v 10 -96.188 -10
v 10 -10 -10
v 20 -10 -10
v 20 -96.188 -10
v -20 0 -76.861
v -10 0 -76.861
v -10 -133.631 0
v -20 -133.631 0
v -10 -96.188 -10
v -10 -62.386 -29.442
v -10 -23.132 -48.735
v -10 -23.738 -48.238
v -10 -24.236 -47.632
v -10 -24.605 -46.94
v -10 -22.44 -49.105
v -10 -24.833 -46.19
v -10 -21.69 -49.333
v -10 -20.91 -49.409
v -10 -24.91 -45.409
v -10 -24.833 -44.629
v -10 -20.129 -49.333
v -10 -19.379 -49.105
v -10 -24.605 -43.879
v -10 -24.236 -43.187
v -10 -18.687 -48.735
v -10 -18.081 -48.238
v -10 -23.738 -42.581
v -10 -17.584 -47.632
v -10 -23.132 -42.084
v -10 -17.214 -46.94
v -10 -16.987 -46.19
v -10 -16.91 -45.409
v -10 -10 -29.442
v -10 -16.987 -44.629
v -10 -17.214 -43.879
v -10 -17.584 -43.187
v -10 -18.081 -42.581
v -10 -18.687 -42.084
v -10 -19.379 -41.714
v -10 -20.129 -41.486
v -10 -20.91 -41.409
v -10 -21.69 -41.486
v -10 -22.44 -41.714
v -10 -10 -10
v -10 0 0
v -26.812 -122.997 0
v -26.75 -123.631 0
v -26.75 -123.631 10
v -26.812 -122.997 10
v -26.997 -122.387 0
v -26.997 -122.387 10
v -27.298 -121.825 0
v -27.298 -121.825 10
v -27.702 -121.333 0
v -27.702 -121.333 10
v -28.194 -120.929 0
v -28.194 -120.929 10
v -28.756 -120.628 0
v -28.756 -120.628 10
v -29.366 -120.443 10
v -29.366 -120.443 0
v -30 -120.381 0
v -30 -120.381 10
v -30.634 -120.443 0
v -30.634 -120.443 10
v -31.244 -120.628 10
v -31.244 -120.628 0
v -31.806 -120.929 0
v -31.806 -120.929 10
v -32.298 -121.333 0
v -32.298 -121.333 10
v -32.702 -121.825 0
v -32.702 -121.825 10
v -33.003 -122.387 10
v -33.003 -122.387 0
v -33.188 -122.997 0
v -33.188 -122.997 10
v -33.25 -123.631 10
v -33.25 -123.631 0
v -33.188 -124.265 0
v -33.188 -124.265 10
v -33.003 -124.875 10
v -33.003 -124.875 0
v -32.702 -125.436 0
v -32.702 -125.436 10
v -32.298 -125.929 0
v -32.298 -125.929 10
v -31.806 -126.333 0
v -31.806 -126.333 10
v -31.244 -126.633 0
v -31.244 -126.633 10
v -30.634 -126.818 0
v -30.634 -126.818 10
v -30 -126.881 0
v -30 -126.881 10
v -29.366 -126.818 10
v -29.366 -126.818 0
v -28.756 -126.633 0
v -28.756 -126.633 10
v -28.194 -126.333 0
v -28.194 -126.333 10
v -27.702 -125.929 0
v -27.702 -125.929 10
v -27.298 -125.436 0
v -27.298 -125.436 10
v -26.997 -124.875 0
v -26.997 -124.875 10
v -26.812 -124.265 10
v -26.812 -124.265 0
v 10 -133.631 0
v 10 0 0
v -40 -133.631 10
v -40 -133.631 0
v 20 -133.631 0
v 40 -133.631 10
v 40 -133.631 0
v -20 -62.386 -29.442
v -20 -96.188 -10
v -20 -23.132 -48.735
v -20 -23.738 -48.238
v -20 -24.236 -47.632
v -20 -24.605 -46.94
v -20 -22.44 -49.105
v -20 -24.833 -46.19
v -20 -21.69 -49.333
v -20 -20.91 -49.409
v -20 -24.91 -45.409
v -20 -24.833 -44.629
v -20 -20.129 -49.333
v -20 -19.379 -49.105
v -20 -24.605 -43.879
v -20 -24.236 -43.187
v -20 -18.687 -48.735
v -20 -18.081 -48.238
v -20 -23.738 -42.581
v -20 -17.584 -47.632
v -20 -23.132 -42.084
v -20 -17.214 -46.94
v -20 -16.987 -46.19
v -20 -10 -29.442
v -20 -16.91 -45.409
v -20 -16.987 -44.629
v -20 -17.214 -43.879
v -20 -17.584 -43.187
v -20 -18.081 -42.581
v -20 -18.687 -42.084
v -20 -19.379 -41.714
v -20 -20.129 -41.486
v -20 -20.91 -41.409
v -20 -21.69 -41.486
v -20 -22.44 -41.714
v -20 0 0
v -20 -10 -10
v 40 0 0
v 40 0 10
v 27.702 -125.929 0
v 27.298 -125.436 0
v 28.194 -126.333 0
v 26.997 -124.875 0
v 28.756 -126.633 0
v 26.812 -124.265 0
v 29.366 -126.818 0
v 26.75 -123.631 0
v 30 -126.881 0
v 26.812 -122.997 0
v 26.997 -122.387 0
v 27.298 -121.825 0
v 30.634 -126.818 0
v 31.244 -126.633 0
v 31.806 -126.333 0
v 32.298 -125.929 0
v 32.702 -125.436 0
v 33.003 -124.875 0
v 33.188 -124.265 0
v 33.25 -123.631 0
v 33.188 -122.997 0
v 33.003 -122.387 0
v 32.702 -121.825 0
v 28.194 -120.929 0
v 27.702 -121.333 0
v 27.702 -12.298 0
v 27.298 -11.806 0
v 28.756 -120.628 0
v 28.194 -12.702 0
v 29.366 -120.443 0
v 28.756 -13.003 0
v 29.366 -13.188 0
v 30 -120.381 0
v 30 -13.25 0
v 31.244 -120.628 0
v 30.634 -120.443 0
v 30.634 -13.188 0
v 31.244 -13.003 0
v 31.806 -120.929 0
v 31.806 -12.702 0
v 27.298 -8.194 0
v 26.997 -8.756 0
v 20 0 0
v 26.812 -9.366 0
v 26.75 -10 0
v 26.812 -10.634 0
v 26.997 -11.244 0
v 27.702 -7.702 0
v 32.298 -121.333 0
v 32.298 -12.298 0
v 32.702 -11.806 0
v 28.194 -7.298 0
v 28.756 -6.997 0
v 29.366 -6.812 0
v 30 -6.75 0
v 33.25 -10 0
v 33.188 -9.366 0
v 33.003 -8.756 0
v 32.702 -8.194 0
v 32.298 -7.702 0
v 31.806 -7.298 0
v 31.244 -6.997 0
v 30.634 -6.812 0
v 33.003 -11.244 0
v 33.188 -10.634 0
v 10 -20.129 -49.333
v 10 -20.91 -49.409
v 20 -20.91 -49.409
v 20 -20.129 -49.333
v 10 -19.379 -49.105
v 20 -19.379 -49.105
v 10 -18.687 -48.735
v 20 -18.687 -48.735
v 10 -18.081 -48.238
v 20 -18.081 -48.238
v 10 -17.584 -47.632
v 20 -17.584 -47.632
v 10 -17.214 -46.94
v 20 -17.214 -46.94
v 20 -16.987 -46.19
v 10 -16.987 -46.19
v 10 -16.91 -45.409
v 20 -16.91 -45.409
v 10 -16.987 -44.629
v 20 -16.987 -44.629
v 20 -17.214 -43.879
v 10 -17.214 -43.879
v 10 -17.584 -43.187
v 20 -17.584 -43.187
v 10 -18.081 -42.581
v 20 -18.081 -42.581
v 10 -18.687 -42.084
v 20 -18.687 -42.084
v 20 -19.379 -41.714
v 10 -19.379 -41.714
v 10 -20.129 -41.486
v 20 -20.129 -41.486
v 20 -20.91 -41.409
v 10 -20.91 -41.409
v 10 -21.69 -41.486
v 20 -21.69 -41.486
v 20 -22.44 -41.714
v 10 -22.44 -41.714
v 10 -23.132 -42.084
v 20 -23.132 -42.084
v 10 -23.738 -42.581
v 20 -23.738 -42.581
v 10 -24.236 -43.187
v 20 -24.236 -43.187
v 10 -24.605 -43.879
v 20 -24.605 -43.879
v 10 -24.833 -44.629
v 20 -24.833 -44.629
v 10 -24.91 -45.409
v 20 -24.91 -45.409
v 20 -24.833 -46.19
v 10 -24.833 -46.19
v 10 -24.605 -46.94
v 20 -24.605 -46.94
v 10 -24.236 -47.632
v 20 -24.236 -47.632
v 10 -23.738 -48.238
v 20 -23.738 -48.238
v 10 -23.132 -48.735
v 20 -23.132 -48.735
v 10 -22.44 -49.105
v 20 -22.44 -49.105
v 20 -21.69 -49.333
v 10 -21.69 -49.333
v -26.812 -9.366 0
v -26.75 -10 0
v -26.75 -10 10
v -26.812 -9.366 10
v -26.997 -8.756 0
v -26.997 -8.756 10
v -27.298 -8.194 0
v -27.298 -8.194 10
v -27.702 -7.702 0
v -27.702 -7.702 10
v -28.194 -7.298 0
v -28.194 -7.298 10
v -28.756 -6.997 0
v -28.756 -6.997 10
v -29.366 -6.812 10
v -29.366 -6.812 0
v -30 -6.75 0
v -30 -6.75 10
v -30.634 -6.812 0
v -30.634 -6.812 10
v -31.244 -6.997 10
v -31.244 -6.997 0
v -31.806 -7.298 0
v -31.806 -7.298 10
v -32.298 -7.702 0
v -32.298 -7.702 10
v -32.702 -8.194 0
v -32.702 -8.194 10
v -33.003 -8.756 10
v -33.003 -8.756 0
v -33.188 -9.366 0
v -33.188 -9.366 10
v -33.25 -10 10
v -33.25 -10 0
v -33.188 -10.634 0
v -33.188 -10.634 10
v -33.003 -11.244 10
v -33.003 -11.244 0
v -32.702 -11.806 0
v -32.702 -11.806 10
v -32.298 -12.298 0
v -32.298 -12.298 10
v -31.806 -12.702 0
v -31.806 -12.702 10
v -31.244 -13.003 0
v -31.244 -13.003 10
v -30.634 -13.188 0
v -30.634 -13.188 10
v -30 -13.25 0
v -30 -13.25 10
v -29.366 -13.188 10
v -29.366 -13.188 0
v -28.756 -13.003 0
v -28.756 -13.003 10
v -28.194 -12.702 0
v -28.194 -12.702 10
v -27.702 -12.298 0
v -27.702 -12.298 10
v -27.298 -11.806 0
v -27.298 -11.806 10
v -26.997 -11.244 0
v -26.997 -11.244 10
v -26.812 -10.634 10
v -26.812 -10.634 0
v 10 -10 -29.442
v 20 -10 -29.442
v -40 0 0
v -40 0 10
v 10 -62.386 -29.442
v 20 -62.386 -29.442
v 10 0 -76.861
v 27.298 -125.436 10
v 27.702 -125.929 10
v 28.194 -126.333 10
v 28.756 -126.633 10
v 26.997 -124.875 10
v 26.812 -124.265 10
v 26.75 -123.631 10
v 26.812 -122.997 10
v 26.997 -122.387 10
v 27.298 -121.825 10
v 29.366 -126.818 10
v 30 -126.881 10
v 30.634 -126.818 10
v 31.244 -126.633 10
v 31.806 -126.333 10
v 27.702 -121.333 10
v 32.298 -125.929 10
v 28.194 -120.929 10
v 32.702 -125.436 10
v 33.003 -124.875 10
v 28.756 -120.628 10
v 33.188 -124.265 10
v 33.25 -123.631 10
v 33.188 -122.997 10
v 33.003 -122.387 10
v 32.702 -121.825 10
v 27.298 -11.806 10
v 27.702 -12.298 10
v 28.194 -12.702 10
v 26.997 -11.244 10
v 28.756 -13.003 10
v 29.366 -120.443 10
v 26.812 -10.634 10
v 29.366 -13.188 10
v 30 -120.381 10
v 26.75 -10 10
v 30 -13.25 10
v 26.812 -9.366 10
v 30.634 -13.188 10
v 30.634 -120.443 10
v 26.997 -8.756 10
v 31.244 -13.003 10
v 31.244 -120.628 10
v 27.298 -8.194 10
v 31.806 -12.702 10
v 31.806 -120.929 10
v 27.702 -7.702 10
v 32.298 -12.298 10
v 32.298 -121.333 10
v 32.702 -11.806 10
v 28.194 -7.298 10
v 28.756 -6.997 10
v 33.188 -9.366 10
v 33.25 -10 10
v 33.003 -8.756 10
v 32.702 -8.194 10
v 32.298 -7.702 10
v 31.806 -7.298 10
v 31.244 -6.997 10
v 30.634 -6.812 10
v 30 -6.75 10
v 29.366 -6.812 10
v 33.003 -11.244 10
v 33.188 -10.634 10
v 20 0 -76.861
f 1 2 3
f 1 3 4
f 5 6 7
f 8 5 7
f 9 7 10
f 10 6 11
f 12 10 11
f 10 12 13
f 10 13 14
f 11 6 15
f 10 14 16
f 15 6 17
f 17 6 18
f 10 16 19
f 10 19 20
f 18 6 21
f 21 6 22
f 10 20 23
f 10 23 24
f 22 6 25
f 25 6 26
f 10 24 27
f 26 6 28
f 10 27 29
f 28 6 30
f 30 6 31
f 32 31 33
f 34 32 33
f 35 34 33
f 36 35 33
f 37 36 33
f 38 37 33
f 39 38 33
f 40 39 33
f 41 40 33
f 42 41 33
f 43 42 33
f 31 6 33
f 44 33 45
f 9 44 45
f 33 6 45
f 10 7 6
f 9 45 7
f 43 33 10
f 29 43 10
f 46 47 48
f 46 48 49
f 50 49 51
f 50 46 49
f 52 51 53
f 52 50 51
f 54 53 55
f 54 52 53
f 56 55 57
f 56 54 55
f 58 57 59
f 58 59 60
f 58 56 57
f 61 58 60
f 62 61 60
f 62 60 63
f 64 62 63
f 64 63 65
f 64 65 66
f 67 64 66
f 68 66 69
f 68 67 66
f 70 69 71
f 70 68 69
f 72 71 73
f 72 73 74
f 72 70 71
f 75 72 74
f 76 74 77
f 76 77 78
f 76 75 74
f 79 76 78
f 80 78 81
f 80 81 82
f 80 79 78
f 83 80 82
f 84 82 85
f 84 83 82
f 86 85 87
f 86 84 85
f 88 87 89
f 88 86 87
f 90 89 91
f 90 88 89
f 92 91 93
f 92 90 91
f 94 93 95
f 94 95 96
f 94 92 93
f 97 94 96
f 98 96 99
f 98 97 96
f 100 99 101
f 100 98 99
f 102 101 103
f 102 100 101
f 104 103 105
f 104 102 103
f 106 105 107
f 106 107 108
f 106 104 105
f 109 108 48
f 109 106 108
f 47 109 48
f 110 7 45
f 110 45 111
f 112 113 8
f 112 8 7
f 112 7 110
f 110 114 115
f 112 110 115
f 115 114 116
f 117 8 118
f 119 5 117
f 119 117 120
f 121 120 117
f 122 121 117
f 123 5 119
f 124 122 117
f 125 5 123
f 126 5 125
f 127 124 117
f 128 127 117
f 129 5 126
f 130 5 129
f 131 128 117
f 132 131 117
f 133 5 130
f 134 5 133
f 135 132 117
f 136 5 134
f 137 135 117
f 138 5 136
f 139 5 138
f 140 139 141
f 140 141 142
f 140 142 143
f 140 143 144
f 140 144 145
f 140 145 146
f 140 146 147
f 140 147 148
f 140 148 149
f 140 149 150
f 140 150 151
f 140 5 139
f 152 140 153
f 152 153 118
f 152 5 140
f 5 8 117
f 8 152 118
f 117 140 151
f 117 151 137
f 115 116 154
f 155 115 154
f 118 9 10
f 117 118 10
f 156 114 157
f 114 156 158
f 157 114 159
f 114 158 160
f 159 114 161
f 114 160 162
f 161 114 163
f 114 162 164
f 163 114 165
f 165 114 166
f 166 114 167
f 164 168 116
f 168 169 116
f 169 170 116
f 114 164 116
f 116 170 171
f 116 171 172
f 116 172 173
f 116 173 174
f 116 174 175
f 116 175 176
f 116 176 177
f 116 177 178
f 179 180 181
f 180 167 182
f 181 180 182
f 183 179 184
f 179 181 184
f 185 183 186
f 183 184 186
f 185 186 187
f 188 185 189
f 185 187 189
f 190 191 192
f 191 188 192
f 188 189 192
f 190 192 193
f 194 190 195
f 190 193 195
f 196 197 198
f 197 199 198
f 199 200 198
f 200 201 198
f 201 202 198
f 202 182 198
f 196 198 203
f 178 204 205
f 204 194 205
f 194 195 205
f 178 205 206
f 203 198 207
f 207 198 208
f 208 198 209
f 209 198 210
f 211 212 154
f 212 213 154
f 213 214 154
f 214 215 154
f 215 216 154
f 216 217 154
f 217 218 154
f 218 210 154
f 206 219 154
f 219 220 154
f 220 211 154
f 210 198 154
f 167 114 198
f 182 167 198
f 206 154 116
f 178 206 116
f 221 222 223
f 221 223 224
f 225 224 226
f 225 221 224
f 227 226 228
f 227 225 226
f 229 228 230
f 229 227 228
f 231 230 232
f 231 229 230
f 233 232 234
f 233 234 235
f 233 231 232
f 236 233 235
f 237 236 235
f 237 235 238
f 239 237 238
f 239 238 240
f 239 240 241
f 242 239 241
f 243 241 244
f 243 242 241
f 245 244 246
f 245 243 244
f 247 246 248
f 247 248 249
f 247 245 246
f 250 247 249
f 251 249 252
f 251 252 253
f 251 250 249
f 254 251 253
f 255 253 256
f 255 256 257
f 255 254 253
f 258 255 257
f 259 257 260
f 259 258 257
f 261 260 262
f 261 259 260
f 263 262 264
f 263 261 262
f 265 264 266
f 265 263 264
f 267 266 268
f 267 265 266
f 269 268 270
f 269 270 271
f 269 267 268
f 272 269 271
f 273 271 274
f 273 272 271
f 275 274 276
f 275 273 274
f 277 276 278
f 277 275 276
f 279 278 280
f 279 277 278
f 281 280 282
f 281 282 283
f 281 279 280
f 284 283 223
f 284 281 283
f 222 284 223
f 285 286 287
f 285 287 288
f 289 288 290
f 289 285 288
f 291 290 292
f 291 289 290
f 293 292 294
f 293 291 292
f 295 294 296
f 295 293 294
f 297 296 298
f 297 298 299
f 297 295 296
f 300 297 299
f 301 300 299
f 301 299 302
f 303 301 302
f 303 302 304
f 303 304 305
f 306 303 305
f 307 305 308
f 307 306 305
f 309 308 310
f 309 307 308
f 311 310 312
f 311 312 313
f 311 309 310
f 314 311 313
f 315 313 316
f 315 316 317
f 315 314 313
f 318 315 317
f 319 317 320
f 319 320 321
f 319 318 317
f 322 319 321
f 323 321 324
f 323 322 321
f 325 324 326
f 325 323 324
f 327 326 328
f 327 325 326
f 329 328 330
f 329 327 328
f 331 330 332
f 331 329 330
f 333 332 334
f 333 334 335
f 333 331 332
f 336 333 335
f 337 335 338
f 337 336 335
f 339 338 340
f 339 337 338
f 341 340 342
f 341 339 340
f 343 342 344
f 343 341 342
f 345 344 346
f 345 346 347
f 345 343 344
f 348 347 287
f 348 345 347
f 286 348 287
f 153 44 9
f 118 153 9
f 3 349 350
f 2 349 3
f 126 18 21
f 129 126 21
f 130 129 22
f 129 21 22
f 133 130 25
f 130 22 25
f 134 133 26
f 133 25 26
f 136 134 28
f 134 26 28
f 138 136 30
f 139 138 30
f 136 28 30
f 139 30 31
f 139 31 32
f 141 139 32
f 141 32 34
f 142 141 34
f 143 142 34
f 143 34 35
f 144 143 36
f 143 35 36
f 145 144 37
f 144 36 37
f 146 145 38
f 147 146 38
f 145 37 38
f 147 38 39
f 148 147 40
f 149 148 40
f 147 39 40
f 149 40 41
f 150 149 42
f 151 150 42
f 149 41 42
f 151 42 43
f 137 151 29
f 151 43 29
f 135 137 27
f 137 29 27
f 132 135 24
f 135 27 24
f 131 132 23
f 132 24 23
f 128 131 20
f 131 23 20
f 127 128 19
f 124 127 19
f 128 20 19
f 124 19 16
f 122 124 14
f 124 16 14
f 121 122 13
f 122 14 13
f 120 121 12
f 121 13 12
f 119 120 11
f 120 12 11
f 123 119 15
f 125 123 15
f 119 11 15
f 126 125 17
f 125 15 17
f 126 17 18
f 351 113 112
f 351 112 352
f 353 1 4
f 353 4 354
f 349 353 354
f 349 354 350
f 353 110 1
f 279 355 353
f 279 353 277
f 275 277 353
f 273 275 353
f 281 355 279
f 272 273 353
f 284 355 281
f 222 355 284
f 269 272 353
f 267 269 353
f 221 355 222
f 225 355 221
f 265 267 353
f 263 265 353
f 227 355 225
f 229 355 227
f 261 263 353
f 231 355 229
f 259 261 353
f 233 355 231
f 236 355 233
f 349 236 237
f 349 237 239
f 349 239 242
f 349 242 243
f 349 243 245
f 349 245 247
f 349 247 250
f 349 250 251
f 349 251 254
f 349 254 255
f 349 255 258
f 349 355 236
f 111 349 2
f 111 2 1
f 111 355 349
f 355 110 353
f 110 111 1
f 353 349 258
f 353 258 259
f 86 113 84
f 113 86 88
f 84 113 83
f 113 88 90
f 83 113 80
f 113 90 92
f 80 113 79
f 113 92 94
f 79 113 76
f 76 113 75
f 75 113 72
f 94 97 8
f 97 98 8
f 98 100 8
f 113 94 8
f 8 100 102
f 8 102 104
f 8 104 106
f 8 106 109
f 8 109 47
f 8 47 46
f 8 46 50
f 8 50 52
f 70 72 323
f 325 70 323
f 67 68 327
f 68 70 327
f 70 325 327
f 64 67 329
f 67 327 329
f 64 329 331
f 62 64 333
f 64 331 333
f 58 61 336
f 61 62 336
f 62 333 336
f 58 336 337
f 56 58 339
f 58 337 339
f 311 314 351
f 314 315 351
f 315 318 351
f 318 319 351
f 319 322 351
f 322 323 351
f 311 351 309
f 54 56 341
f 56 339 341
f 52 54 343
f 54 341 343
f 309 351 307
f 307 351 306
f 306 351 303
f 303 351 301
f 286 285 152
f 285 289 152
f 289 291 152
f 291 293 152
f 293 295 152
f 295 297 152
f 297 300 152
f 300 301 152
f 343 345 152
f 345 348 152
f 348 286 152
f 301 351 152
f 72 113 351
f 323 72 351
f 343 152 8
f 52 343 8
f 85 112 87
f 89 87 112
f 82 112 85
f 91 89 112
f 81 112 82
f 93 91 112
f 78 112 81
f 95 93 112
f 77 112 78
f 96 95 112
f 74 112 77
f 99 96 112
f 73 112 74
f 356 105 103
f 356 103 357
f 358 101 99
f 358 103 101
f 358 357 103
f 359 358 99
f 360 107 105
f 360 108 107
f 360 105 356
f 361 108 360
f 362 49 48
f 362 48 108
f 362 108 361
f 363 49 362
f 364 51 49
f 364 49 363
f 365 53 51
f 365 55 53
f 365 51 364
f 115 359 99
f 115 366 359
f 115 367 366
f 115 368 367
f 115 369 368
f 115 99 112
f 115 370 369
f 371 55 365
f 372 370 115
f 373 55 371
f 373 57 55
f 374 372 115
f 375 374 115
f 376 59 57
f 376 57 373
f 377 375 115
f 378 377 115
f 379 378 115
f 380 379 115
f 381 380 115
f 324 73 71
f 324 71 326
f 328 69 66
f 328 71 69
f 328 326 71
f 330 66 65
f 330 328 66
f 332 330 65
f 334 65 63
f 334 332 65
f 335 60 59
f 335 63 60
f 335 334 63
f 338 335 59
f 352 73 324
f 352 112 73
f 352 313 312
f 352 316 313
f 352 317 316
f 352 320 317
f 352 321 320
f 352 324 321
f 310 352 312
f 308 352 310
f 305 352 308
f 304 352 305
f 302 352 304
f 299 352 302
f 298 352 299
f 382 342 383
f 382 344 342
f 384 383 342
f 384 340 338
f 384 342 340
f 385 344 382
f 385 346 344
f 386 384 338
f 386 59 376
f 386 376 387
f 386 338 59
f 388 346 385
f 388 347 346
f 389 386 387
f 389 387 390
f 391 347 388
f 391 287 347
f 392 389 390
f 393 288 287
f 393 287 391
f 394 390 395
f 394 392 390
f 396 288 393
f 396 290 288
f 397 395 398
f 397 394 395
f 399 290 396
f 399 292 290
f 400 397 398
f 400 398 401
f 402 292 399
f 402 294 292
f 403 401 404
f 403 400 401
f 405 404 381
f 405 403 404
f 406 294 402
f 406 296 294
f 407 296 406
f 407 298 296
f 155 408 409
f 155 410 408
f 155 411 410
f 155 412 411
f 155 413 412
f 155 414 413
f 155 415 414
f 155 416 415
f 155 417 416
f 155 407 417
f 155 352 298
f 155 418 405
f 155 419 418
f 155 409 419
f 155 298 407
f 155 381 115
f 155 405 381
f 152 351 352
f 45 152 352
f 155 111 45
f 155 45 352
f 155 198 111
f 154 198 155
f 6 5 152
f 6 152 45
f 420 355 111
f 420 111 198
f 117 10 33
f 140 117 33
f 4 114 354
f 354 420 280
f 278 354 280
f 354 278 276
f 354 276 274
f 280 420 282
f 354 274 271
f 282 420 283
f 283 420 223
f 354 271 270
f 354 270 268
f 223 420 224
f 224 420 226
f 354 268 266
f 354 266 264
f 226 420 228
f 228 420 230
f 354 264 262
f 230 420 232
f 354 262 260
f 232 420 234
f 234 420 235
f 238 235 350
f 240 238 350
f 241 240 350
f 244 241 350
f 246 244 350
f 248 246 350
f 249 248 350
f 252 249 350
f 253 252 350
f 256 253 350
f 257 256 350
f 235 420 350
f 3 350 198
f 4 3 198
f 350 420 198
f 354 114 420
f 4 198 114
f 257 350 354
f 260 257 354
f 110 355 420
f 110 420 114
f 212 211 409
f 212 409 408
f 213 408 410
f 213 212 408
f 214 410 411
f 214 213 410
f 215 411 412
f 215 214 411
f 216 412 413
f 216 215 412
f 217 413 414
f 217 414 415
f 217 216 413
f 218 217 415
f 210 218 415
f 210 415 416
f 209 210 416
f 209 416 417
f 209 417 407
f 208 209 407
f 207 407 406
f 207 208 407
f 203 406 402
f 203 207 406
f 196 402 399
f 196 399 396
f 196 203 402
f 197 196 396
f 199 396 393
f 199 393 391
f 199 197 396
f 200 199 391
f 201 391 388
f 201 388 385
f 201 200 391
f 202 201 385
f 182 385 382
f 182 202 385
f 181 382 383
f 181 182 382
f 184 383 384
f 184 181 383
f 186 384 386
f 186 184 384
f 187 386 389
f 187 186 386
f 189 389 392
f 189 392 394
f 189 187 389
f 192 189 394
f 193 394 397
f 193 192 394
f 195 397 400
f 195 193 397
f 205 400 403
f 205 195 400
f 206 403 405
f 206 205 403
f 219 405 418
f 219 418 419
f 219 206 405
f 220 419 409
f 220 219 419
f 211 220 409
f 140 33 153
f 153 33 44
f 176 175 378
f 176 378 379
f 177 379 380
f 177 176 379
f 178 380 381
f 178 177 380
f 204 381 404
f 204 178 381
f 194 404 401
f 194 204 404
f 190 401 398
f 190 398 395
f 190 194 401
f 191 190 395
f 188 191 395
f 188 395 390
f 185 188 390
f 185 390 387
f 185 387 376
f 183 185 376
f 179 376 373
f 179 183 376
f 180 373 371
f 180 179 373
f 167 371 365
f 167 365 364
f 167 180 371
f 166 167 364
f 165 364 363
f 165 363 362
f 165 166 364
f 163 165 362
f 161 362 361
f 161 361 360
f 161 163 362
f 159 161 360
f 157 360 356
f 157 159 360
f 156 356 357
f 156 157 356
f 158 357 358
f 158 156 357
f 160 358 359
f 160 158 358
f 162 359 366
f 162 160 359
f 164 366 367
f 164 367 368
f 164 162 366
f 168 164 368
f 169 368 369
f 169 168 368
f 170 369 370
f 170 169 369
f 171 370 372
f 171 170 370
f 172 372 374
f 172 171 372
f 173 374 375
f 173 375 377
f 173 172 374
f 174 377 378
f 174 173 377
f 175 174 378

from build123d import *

# Parameters (mm, degrees)
ESBO_O1_R                = 4
RESSALTO_EXTRUS_O2_DEPTH = 10
ESBO_O2_W                = 80
ESBO_O2_H                = 133.630843717
ESBO_O2_R                = 3.25
RESSALTO_EXTRUS_O3_DEPTH = 10


with BuildPart() as part:
    # Esboço1 → Ressalto-extrusão2 (new body)
    with BuildSketch(Plane(origin=(10, 0, 0), x_dir=(0, 0, -1), z_dir=(1, 0, 0))):
        Polygon((0, 0), (76.860522137, 0), (0, -133.630843717), align=None)
        with Locations((45.40940211, -20.909755611)):
            Circle(ESBO_O1_R, mode=Mode.SUBTRACT)
        Polygon((10, -10), (10, -96.187822441), (29.441560186, -62.386437561), (29.441560186, -10), align=None, mode=Mode.SUBTRACT)
    extrude(amount=RESSALTO_EXTRUS_O2_DEPTH)


with BuildPart() as body_2:
    # Espelhar2: mirrored copy
    add(part.part.mirror(Plane(origin=(0, 0, 0), x_dir=(0, 0, 1), z_dir=(1, 0, 0))))


with BuildPart() as part_1:
    add(part.part)

    add(body_2.part)  # Ressalto-extrusão3 merges body 2
    # Esboço2 → Ressalto-extrusão3 (add)
    with BuildSketch(Plane.XY):
        with Locations((0, -66.815421859)):
            Rectangle(ESBO_O2_W, ESBO_O2_H)
        with Locations((-30, -10)):
            Circle(ESBO_O2_R, mode=Mode.SUBTRACT)
        with Locations((30, -10)):
            Circle(ESBO_O2_R, mode=Mode.SUBTRACT)
        with Locations((-30, -123.630843717)):
            Circle(ESBO_O2_R, mode=Mode.SUBTRACT)
        with Locations((30, -123.630843717)):
            Circle(ESBO_O2_R, mode=Mode.SUBTRACT)
    extrude(amount=RESSALTO_EXTRUS_O3_DEPTH)


solid = part_1.part
